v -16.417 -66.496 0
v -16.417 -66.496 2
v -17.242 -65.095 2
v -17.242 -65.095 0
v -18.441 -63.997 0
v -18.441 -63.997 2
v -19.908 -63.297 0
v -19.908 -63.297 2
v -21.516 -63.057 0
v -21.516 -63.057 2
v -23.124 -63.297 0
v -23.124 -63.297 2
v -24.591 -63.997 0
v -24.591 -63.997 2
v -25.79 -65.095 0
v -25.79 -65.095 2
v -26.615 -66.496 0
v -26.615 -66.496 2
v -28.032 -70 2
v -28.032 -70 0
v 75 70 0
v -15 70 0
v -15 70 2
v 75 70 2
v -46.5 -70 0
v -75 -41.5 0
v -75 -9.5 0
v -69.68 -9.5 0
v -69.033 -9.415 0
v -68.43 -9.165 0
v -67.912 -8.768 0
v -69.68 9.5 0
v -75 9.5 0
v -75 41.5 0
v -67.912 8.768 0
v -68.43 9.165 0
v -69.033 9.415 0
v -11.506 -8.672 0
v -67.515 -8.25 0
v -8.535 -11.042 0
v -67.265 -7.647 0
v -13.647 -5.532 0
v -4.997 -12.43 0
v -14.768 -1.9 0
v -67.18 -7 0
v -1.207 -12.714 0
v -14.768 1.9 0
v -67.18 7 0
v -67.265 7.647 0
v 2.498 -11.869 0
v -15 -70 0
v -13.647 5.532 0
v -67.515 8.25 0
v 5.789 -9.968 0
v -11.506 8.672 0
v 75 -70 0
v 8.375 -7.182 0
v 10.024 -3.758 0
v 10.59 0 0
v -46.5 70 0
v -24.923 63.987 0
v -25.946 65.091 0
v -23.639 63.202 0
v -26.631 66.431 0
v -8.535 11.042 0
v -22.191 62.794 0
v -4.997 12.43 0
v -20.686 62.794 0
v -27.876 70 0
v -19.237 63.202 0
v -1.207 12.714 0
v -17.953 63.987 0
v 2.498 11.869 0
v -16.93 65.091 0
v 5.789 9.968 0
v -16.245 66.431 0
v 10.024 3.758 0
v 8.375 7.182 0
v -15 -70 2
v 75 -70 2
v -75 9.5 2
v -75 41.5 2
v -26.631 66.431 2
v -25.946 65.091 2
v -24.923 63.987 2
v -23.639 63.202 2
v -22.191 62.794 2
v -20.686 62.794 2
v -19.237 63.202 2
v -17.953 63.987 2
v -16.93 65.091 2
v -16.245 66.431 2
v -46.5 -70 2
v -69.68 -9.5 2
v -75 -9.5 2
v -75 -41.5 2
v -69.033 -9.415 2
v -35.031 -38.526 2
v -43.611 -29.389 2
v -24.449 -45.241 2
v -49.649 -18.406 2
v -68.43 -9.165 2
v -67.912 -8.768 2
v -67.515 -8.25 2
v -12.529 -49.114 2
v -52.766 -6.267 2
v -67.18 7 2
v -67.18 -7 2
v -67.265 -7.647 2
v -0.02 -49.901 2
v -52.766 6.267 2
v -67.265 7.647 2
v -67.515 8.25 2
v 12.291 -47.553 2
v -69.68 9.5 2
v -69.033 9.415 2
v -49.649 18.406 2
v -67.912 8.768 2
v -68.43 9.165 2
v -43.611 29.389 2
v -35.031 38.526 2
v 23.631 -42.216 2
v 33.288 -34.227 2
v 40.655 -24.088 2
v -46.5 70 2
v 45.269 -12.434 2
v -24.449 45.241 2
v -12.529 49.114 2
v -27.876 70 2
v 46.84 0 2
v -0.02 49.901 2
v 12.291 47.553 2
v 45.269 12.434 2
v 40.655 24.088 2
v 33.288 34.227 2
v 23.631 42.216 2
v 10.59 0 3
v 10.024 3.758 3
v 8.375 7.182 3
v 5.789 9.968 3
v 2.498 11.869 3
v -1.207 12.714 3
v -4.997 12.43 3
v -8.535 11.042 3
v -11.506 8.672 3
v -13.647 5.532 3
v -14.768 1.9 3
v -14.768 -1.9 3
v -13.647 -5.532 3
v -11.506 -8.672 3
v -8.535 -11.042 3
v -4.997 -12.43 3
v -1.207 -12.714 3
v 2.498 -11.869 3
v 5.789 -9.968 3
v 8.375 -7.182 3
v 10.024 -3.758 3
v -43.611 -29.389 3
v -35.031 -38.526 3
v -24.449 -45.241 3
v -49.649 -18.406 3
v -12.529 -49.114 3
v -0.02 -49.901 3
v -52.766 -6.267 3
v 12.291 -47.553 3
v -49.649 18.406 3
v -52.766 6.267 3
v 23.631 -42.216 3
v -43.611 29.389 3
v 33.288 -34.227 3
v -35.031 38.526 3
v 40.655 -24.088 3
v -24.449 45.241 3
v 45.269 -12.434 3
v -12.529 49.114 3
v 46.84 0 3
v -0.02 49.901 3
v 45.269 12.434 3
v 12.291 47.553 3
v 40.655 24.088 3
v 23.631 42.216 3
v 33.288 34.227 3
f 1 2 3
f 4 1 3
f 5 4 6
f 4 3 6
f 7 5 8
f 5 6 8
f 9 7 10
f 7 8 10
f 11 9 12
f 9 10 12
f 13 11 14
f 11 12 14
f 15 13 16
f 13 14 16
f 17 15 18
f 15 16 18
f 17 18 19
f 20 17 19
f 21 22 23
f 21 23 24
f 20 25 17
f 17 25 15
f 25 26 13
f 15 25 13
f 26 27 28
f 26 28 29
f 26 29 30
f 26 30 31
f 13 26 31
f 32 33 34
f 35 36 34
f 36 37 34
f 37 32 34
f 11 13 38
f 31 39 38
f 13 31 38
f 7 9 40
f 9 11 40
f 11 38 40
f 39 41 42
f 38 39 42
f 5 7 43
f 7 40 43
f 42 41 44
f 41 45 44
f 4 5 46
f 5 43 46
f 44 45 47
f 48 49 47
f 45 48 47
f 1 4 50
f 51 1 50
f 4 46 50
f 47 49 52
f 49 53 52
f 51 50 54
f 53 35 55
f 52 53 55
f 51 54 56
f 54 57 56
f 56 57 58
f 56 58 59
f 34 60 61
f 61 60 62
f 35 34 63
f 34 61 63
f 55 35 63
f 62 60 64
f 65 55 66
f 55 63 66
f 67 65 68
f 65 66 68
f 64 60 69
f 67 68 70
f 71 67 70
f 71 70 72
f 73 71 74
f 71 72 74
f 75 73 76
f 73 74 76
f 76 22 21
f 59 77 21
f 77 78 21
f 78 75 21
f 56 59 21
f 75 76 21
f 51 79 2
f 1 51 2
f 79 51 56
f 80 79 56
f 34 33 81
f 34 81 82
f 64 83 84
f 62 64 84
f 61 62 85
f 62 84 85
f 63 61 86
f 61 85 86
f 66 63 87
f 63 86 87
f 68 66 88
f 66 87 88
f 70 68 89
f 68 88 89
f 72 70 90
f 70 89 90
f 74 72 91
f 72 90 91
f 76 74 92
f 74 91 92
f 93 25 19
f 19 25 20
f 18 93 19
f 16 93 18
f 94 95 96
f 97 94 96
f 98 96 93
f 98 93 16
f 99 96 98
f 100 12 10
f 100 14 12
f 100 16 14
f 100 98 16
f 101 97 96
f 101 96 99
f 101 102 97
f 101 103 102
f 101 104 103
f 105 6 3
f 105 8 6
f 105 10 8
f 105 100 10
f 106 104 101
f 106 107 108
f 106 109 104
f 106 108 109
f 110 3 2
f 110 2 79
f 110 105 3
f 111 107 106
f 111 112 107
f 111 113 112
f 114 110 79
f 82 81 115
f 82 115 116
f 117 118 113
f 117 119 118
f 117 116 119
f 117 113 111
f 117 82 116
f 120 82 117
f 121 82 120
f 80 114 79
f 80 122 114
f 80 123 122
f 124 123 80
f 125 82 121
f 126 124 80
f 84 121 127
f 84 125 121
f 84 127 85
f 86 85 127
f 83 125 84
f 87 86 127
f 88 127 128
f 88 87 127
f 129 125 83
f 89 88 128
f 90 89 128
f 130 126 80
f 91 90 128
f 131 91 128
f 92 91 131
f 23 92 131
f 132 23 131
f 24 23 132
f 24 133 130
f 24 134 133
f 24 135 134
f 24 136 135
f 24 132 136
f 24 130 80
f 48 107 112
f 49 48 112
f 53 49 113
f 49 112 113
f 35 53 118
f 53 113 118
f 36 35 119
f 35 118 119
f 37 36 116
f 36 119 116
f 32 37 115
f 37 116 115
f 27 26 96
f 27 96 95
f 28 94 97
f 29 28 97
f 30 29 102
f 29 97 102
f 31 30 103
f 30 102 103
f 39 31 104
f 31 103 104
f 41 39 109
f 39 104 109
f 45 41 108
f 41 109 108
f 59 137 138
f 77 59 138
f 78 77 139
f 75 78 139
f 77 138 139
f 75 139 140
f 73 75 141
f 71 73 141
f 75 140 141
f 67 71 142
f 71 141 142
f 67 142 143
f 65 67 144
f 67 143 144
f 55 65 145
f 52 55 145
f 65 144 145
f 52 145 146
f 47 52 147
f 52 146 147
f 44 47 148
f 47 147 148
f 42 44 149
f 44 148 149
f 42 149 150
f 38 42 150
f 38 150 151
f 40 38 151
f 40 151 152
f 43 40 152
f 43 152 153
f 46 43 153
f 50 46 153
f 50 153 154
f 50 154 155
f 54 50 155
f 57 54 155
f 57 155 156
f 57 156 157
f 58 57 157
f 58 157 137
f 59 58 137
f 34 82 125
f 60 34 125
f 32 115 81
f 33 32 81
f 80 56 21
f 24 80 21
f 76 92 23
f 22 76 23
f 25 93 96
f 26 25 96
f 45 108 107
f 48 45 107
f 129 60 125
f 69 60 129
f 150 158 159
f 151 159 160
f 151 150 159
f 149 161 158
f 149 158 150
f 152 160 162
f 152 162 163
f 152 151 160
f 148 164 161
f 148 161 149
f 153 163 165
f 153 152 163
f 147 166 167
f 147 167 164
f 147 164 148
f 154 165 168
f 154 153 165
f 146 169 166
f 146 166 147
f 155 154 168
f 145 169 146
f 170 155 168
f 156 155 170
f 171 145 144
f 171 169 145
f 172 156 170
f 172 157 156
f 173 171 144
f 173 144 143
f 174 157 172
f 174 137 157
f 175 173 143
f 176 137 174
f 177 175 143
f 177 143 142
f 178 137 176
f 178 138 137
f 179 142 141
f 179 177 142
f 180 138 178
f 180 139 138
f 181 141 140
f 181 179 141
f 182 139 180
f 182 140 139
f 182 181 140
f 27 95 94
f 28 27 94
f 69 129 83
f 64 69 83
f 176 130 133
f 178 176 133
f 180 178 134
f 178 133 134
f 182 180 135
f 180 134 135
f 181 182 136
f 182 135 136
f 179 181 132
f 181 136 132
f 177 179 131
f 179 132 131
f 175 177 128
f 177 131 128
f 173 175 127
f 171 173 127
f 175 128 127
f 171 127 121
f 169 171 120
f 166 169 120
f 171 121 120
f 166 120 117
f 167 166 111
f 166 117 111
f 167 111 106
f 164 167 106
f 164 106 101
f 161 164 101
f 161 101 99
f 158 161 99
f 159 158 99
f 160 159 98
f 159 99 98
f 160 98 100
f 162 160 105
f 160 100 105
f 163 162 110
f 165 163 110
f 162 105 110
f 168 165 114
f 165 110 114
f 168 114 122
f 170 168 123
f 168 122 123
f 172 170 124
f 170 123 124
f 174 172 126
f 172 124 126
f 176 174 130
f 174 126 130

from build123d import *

# Parameters (mm, degrees)
F0_W      = 150
F0_H      = 140
F1_DEPTH  = 2
F3_DEPTH  = 2.001
F5_DEPTH  = 2.001
F7_DEPTH  = 2.001
F8_R      = 50
F9_DEPTH  = 1
F10_R     = 12.75
F11_DEPTH = 25


with BuildPart() as f1:
    # F0 (on Top) → F1 (new body)
    with BuildSketch(Plane.XY):
        Rectangle(F0_W, F0_H)
    extrude(amount=F1_DEPTH)

    # F2 (on face) → F3 (cut, through all)
    with BuildSketch(Plane.XY.offset(2)):
        Polygon((-75, 70), (-75, 41.5), (-46.5, 70), align=None)
        Polygon((-46.5, -70), (-75, -41.5), (-75, -70), align=None)
    extrude(amount=-F3_DEPTH, mode=Mode.SUBTRACT)

    # F4 (on face) → F5 (cut, through all)
    with BuildSketch(Plane.XY.offset(2)):
        with BuildLine():
            Line((-69.68, 9.5), (-75, 9.5))
            Line((-75, 9.5), (-75, -9.5))
            Line((-75, -9.5), (-69.68, -9.5))
            ThreePointArc((-69.68, -9.5), (-67.912233, -8.767767), (-67.18, -7))
            Line((-67.18, -7), (-67.18, 7))
            ThreePointArc((-67.18, 7), (-67.912233, 8.767767), (-69.68, 9.5))
        make_face()
    extrude(amount=-F5_DEPTH, mode=Mode.SUBTRACT)

    # F6 (on face) → F7 (cut, through all)
    with BuildSketch(Plane.XY.offset(2)):
        with BuildLine():
            Line((-28.031671, -70), (-15, -70))
            Line((-15, -70), (-16.416769, -66.495551))
            ThreePointArc((-16.416769, -66.495551), (-21.515836, -63.056988), (-26.614902, -66.495551))
            Line((-26.614902, -66.495551), (-28.031671, -70))
        make_face()
        with BuildLine():
            Line((-27.876137, 70), (-26.631231, 66.430881))
            ThreePointArc((-26.631231, 66.430881), (-21.438069, 62.742254), (-16.244907, 66.430881))
            Line((-16.244907, 66.430881), (-15, 70))
            Line((-15, 70), (-27.876137, 70))
        make_face()
    extrude(amount=-F7_DEPTH, mode=Mode.SUBTRACT)

    # F8 (on face) → F9 (join)
    with BuildSketch(Plane.XY.offset(2)):
        with Locations((-3.16, 0)):
            Circle(F8_R)
    extrude(amount=F9_DEPTH)

    # F10 (on face) → F11 (cut)
    with BuildSketch(Plane.XY.offset(3)):
        with Locations((-2.16, 0)):
            Circle(F10_R)
    extrude(amount=-F11_DEPTH, mode=Mode.SUBTRACT)


solid = f1.part
